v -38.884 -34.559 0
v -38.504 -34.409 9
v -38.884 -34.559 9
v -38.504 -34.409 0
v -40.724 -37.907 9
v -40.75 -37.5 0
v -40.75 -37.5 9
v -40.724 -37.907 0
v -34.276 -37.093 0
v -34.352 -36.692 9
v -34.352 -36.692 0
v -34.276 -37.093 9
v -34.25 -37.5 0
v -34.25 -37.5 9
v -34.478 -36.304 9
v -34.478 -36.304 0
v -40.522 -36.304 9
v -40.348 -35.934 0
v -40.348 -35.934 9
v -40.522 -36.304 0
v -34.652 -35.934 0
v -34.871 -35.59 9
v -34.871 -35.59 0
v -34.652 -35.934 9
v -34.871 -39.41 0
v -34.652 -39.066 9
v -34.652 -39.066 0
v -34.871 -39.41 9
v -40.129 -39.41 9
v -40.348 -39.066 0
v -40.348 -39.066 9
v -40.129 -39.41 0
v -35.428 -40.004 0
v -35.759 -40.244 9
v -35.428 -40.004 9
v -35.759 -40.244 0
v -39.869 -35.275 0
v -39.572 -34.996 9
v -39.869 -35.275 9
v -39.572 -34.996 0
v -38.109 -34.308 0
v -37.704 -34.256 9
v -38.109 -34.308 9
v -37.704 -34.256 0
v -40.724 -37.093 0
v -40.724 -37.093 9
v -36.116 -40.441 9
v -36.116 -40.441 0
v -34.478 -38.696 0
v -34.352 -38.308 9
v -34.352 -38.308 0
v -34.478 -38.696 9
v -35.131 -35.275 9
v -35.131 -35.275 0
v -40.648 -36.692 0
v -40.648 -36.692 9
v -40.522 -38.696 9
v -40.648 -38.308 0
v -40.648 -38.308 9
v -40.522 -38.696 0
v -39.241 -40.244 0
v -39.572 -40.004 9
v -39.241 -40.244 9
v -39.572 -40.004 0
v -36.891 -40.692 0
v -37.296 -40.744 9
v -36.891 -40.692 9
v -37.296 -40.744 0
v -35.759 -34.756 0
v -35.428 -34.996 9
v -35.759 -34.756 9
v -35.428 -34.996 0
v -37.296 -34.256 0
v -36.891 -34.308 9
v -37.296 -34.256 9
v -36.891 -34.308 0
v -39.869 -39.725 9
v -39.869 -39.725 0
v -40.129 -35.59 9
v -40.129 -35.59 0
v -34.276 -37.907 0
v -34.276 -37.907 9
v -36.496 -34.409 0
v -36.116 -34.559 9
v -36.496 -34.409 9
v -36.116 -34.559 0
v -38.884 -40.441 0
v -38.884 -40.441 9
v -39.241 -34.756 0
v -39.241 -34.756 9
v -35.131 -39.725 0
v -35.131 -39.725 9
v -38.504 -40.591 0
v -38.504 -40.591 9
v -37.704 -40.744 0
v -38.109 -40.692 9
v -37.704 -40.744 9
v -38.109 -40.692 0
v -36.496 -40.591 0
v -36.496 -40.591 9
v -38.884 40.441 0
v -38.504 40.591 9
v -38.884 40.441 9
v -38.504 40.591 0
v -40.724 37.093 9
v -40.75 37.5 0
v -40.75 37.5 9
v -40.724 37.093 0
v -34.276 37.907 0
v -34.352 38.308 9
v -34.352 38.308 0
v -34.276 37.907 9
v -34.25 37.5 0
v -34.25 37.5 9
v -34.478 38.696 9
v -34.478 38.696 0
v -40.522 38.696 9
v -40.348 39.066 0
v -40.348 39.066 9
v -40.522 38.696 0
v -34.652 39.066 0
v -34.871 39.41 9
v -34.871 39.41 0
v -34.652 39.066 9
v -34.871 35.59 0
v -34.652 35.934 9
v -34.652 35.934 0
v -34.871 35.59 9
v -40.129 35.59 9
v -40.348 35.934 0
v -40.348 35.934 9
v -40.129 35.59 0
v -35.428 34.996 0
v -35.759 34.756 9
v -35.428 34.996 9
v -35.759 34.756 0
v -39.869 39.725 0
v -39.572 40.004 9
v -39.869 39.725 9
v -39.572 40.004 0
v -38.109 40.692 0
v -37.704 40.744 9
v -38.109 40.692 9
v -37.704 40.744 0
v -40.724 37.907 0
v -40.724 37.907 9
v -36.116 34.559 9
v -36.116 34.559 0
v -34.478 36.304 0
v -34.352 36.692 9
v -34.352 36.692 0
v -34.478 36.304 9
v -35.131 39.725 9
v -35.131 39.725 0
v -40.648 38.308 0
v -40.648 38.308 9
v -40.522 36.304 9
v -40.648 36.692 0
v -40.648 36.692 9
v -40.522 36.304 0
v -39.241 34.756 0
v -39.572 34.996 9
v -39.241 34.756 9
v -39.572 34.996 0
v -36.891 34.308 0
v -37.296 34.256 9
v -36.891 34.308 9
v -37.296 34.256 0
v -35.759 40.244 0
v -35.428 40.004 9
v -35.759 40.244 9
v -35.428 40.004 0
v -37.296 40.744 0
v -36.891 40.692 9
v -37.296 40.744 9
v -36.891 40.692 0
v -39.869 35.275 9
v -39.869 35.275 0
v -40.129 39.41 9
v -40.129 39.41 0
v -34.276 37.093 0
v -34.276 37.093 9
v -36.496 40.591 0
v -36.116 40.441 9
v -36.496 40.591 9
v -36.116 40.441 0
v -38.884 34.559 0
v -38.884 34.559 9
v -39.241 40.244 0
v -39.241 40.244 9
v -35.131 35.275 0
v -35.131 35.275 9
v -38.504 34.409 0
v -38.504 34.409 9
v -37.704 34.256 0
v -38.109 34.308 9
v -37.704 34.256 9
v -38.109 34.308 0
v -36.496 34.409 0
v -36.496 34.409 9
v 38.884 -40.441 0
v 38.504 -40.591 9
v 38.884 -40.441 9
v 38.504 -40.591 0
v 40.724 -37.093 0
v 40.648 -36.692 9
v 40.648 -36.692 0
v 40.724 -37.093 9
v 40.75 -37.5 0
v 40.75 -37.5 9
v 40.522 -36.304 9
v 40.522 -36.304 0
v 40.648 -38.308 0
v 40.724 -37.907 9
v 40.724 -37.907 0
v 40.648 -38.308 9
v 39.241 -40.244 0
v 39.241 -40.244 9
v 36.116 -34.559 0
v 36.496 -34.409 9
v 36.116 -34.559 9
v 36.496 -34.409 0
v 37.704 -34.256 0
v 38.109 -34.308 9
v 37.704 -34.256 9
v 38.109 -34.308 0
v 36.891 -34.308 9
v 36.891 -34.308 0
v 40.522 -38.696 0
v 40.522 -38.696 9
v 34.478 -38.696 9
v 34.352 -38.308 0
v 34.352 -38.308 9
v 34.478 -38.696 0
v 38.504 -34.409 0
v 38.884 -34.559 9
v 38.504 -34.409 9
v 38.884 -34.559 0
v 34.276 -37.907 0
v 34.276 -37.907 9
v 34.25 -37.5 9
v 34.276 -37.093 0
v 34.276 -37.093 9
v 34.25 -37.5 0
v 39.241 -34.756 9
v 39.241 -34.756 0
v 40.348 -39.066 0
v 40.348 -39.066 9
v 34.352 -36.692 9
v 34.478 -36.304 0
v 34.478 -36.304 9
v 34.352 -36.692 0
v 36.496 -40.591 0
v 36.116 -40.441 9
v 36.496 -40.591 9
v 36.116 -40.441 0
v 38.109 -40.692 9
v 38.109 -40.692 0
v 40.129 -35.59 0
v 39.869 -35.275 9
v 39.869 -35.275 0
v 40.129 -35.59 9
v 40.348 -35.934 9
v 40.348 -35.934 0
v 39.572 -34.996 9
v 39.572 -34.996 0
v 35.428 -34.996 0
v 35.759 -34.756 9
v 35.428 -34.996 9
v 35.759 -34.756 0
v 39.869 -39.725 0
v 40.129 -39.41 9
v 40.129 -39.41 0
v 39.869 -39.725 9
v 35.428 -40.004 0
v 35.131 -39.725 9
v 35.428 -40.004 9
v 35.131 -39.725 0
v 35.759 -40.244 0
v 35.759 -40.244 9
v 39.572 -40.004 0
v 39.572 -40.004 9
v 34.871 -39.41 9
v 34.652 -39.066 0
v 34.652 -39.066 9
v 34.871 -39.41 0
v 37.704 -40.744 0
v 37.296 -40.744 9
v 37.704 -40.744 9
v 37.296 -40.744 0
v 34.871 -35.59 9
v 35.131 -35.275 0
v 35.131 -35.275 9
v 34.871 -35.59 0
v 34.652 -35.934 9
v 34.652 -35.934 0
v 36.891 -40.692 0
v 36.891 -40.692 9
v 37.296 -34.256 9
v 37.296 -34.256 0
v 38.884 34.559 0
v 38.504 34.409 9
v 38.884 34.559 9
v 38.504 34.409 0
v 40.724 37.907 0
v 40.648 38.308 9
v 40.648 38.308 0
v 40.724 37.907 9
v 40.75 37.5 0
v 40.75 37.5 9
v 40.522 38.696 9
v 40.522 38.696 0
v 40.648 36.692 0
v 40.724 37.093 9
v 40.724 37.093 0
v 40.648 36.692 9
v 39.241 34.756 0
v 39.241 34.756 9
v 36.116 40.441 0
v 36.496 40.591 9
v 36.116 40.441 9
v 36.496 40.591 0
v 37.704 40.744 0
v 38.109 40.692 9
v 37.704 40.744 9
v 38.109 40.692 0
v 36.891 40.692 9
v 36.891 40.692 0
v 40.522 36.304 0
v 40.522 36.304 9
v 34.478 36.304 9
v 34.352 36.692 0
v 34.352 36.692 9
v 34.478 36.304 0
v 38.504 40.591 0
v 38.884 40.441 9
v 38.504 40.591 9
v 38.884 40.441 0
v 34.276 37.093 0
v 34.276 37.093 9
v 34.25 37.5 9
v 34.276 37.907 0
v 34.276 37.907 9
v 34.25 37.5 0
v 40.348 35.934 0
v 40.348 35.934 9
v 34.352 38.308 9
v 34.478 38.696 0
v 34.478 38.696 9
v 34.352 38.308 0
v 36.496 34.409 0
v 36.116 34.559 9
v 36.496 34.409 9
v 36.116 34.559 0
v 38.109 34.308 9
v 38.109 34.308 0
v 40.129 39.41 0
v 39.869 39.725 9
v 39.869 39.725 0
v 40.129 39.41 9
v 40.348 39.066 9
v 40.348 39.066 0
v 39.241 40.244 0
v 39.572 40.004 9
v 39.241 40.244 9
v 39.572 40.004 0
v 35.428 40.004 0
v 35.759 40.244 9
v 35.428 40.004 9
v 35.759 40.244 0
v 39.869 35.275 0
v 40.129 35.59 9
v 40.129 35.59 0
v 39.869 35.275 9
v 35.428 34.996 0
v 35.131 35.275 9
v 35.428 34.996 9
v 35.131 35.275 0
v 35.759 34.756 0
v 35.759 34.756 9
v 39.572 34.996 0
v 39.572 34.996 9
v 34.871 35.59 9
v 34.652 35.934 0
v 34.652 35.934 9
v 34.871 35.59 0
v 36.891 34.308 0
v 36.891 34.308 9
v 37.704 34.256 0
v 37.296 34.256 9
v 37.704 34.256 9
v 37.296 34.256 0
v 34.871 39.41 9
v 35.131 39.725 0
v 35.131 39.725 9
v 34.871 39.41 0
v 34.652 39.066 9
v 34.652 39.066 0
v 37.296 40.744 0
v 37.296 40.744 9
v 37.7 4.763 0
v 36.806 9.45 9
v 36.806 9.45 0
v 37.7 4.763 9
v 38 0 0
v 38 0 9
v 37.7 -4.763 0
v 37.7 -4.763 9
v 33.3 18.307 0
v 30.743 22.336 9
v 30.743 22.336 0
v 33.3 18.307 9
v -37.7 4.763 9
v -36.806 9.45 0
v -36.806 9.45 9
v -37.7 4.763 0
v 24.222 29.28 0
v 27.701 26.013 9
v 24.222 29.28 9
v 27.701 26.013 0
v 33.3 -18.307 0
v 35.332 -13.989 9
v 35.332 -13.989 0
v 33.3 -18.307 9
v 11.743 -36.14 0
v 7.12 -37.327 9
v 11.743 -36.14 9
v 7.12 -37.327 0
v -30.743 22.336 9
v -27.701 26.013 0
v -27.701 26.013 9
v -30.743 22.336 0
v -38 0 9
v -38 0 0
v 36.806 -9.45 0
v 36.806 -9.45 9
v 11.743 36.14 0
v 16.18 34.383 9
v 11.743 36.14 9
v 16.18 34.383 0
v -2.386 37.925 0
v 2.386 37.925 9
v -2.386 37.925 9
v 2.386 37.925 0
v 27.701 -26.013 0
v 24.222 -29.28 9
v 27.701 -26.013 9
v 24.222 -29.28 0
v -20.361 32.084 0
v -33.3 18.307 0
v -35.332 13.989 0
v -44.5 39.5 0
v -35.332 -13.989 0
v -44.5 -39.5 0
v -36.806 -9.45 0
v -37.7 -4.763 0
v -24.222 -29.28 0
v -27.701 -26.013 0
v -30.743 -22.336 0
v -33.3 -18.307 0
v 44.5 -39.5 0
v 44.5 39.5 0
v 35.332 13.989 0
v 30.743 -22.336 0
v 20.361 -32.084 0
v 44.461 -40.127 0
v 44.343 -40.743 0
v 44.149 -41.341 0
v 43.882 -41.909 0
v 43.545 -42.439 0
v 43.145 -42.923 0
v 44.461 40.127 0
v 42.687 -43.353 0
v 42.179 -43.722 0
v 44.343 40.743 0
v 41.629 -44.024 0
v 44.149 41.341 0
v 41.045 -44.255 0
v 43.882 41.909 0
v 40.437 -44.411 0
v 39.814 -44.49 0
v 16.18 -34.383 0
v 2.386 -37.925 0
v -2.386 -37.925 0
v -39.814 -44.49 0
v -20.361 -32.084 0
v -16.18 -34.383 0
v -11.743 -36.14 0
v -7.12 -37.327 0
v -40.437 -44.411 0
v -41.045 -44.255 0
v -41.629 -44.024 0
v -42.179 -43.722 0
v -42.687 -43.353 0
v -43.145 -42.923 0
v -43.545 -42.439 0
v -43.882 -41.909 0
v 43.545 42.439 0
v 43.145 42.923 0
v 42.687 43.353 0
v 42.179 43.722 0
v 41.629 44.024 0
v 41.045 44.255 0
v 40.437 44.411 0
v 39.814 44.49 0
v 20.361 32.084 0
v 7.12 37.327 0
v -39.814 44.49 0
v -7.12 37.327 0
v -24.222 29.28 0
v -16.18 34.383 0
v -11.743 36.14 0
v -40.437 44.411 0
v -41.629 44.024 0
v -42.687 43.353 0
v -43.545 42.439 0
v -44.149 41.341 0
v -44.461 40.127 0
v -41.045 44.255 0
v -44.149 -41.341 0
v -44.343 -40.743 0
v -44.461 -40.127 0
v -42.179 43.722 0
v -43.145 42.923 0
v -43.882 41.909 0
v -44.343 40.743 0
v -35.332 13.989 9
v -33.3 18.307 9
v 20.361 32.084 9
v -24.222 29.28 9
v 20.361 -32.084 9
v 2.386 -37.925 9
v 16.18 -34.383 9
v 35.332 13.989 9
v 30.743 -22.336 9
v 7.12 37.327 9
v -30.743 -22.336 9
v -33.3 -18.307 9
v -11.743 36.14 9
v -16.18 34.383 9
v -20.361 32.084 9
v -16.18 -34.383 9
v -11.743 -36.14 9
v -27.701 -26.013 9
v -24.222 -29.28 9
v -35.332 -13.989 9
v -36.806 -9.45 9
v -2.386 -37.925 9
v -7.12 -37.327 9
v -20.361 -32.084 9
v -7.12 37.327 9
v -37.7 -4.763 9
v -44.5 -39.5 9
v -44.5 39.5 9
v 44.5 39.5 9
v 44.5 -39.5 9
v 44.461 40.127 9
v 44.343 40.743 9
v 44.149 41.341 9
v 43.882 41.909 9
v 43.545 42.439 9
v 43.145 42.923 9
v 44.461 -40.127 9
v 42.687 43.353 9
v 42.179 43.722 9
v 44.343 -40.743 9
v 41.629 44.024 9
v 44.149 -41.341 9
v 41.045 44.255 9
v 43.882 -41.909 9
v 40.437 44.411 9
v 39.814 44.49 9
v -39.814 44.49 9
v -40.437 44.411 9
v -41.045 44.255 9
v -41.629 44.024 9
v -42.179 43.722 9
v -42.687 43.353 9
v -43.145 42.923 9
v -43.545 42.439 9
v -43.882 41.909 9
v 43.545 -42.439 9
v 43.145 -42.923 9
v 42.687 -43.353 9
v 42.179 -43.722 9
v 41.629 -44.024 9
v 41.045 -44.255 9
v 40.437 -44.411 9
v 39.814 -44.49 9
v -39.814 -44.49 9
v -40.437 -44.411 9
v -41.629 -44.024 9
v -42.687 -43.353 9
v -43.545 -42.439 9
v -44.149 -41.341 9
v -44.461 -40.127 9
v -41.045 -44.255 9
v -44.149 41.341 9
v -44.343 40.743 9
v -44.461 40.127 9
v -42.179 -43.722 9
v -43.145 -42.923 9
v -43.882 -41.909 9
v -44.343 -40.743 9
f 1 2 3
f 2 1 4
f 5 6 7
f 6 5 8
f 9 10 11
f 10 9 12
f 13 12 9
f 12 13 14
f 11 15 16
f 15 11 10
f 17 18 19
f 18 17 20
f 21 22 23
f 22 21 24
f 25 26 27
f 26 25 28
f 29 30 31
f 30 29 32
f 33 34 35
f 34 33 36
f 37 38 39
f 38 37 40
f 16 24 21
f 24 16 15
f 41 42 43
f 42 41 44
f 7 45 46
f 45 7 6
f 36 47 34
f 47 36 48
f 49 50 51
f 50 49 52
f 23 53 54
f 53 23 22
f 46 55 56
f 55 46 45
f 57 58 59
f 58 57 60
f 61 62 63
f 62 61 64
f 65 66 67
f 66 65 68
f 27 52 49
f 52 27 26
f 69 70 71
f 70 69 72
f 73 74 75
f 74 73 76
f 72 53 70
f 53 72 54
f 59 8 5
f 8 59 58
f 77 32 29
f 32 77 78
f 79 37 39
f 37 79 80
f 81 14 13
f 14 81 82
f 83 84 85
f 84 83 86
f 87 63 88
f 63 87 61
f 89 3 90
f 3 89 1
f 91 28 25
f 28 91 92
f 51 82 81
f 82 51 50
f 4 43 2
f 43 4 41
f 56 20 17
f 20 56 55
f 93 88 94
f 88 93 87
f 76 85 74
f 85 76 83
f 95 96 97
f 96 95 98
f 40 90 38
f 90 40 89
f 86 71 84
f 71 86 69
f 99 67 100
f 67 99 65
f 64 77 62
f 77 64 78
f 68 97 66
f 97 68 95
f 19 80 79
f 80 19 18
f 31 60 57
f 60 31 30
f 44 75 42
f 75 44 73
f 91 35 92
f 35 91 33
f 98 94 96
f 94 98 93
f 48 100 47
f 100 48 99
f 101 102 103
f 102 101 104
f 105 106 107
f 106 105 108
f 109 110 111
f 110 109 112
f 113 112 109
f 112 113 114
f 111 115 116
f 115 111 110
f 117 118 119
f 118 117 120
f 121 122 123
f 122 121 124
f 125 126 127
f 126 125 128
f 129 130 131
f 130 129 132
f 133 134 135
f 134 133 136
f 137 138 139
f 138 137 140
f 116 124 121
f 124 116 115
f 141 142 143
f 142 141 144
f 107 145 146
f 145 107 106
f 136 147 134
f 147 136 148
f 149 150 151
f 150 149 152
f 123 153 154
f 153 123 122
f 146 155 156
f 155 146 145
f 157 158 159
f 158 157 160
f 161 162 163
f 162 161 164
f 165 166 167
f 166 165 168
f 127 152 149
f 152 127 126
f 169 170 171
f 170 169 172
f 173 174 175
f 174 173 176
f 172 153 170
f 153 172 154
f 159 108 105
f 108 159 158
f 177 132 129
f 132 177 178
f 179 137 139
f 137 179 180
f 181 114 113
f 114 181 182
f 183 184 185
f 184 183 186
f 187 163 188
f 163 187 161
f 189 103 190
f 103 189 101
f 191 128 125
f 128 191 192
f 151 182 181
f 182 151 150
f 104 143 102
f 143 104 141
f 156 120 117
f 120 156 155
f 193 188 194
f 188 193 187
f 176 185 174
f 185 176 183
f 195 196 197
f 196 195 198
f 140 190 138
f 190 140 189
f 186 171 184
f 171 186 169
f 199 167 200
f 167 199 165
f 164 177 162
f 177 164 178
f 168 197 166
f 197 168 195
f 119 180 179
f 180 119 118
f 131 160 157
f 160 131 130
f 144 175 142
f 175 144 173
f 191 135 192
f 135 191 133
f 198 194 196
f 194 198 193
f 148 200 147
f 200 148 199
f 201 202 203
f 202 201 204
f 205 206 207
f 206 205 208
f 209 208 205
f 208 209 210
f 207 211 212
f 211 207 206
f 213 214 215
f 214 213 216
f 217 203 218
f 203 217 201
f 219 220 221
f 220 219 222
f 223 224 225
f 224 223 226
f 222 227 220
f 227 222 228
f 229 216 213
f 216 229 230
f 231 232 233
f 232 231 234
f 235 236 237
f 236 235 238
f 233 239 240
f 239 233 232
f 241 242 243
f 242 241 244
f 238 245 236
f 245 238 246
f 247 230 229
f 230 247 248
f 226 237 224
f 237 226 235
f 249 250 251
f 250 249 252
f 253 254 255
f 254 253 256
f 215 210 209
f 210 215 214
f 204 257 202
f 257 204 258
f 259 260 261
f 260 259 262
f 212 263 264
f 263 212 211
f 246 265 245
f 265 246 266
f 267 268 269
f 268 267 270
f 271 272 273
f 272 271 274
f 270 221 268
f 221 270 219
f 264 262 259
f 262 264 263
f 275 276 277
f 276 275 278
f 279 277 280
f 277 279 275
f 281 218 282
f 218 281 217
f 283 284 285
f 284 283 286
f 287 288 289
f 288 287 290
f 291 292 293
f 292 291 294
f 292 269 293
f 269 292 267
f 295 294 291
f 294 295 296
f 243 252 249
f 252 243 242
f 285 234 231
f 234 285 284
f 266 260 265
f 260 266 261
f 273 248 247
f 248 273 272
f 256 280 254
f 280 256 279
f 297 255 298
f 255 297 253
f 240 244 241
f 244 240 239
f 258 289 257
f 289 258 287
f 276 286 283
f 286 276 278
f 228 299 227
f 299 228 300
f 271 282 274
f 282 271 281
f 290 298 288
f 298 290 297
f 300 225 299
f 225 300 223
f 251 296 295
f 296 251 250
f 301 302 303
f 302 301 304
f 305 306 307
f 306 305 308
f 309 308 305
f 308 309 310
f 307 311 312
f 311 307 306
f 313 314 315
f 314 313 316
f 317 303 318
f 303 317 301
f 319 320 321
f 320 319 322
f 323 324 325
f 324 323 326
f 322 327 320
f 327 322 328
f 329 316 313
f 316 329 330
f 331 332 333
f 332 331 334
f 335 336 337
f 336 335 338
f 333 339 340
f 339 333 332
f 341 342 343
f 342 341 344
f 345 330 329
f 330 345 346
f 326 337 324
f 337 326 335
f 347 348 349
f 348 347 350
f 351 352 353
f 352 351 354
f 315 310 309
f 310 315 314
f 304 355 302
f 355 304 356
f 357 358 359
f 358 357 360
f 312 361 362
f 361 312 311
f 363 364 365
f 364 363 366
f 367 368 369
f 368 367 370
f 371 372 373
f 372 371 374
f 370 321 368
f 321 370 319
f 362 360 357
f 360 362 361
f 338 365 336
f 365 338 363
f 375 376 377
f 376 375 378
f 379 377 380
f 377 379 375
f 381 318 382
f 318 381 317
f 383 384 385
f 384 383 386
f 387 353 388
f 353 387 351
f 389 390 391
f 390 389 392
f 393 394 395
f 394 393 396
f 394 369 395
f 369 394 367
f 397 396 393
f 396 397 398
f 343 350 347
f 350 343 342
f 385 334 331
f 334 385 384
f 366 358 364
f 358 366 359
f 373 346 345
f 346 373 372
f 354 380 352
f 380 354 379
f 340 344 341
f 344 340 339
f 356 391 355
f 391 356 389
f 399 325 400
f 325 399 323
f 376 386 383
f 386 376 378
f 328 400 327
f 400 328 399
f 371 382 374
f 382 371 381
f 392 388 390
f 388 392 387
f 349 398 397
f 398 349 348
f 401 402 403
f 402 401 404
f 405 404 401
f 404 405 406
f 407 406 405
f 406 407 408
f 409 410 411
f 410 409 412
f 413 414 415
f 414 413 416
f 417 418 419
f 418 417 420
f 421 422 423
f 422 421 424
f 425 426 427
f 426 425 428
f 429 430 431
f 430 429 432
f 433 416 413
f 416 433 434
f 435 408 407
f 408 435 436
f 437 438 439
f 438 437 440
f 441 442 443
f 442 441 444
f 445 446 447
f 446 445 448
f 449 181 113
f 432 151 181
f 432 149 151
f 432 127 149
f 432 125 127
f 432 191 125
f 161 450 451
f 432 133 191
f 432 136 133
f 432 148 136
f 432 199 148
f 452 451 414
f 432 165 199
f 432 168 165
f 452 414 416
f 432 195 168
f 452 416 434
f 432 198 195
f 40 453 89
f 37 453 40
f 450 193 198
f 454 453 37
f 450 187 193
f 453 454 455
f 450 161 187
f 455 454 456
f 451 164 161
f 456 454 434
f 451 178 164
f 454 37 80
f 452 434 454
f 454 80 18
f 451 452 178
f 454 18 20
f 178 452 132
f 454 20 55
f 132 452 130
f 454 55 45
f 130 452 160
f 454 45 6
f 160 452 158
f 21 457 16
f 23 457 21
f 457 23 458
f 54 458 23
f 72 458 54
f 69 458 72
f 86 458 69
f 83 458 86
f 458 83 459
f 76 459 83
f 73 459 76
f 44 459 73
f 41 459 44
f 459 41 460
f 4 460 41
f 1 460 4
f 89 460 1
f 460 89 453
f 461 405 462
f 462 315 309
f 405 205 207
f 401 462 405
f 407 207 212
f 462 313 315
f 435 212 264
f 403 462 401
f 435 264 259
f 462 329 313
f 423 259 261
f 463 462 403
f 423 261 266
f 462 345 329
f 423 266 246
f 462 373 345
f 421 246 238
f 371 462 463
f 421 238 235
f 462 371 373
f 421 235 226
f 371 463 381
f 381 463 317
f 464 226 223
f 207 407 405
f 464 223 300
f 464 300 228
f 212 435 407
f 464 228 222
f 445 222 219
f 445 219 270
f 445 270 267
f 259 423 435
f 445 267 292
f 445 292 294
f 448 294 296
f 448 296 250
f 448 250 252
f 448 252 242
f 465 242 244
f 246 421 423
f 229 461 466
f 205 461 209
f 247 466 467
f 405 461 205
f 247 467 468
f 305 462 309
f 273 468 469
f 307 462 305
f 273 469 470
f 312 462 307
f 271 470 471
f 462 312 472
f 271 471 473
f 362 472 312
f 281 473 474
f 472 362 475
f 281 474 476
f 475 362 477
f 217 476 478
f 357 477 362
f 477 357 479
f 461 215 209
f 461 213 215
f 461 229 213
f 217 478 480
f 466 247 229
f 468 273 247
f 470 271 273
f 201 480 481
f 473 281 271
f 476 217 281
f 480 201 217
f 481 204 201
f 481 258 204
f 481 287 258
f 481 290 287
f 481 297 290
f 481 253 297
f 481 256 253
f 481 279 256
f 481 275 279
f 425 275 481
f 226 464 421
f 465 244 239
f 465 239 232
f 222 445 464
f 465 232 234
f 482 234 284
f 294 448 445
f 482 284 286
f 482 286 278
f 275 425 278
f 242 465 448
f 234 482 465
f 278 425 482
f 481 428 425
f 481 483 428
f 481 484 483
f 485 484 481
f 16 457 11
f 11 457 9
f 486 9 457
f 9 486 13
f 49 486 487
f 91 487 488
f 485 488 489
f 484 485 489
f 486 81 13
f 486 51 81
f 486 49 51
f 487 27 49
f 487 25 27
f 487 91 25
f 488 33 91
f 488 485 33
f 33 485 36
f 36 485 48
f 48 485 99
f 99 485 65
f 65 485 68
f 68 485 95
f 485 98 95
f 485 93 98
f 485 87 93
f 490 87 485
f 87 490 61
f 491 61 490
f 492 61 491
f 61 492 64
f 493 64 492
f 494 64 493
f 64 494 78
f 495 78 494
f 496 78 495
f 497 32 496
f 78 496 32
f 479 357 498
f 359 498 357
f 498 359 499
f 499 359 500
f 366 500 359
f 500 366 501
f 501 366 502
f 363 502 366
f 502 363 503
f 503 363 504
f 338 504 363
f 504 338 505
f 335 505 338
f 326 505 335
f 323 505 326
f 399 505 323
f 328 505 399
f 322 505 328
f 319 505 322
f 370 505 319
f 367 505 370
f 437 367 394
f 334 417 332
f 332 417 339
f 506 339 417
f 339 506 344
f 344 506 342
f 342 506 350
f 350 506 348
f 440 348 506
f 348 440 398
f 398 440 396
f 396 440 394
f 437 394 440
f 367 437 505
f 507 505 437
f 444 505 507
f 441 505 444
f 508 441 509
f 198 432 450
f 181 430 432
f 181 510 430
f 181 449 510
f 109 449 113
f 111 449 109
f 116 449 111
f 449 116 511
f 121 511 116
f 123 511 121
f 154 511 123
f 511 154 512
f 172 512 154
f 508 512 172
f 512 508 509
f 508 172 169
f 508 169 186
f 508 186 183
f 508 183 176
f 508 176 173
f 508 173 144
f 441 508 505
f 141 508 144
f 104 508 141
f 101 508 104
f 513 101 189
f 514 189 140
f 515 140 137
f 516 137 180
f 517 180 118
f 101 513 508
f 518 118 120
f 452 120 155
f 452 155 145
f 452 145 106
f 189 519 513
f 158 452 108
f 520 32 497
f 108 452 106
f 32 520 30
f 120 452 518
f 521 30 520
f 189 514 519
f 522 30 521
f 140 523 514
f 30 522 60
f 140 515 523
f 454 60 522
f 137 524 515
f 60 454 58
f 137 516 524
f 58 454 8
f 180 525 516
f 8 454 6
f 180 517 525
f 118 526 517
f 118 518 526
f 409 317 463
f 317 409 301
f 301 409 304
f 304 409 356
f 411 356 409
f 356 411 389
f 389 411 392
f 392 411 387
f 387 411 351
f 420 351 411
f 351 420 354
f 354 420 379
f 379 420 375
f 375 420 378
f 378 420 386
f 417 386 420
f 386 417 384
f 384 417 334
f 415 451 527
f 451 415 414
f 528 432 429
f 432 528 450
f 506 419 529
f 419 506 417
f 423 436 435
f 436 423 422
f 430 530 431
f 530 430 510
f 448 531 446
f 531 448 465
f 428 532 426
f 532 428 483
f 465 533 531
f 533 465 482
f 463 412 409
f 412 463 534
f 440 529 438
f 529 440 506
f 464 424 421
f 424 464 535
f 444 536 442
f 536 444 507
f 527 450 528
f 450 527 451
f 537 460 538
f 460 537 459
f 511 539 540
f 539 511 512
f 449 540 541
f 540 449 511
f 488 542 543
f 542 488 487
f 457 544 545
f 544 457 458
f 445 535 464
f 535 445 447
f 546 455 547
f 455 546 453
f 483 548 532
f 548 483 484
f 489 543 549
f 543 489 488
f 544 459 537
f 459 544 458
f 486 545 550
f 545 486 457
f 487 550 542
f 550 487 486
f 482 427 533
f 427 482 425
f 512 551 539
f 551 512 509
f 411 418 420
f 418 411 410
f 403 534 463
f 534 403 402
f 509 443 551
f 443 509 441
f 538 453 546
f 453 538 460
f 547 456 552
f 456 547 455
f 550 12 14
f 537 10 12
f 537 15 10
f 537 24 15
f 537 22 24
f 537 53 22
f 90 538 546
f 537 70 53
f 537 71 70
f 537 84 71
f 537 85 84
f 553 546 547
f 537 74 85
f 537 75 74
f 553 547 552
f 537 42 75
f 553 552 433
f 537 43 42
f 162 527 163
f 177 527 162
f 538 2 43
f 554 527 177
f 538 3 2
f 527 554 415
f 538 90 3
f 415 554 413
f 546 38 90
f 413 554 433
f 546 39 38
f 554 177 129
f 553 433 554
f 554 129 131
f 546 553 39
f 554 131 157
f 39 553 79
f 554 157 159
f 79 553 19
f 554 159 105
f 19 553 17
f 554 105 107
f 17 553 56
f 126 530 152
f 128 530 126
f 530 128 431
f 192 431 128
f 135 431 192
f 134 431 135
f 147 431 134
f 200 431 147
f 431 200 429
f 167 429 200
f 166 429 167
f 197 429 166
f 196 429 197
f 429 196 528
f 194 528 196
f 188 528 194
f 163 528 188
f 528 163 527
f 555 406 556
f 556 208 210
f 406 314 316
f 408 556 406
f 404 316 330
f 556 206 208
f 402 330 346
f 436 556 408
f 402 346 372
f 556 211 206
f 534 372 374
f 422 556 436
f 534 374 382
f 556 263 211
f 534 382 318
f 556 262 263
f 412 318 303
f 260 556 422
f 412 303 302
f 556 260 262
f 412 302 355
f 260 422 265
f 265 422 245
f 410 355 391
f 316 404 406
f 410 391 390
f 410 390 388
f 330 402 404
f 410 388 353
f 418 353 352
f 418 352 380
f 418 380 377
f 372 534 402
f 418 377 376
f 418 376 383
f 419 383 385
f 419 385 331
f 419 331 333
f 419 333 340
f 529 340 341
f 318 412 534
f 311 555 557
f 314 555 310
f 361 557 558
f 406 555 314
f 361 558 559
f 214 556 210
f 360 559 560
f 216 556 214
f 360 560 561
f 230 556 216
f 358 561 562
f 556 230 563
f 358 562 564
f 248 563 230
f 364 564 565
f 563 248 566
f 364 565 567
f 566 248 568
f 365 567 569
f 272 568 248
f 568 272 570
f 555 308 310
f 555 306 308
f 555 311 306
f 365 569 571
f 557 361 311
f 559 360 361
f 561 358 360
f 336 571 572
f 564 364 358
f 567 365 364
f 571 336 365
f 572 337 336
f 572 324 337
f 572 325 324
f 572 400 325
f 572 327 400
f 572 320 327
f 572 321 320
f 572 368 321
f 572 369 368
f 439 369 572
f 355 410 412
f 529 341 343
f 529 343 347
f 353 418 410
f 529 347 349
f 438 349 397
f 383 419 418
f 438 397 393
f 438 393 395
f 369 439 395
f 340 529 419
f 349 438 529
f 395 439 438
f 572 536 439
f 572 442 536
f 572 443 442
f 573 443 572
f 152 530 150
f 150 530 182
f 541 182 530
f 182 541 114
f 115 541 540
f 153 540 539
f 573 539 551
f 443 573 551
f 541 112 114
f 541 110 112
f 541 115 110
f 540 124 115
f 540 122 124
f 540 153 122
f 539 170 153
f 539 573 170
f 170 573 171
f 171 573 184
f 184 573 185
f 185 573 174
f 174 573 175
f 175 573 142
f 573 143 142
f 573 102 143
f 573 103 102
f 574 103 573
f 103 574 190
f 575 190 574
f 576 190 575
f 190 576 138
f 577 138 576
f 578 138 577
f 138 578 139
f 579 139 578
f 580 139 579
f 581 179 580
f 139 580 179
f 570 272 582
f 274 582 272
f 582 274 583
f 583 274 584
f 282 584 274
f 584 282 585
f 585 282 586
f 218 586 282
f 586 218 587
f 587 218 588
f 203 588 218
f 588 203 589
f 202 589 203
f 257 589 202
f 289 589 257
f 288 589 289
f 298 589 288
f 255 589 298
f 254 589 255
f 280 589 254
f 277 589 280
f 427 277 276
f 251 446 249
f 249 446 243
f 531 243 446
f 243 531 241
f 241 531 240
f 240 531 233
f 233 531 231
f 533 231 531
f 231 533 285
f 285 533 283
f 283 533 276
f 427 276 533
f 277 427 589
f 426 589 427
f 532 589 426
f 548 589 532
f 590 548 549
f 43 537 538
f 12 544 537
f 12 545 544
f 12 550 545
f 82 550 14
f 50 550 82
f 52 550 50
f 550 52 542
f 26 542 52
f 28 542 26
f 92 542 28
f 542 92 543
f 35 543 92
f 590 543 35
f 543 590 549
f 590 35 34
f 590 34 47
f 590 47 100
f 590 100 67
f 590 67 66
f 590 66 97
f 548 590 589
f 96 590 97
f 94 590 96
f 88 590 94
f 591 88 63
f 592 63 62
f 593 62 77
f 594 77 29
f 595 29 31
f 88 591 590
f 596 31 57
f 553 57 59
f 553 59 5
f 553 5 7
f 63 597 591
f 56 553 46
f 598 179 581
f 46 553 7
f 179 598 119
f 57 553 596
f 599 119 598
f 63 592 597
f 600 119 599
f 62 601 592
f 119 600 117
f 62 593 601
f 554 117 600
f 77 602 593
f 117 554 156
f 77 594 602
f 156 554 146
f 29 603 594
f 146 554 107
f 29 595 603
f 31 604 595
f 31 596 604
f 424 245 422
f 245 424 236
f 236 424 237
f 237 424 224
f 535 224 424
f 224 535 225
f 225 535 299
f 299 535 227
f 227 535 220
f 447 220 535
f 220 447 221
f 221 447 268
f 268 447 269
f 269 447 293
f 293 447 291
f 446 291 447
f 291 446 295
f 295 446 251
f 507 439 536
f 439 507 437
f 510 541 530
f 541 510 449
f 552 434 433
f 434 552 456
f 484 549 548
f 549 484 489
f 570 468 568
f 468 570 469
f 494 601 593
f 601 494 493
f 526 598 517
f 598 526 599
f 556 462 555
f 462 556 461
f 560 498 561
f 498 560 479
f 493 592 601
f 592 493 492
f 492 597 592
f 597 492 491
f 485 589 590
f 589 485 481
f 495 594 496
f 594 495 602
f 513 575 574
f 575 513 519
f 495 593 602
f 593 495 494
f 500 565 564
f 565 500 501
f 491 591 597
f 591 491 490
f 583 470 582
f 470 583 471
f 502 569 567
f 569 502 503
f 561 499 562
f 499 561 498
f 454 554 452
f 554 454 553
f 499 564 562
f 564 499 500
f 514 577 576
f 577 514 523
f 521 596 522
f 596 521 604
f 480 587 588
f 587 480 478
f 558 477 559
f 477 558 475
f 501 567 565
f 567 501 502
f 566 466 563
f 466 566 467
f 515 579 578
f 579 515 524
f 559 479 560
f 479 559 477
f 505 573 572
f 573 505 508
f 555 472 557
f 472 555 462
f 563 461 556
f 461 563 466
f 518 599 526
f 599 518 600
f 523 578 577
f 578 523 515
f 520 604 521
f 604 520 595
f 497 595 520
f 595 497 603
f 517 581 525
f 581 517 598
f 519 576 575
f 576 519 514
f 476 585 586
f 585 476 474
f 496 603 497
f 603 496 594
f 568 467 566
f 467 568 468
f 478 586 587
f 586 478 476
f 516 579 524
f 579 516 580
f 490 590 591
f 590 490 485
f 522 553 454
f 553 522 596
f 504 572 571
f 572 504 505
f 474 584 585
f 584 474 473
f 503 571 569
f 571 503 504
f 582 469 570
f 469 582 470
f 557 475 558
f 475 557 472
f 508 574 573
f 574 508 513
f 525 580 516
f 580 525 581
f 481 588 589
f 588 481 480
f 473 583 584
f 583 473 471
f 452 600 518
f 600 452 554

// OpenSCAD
$fn = 50;


difference() {
	union() {
		hull() {
			translate(v = [-39.5000000000, 39.5000000000, 0]) {
				cylinder(h = 9, r = 5);
			}
			translate(v = [39.5000000000, 39.5000000000, 0]) {
				cylinder(h = 9, r = 5);
			}
			translate(v = [-39.5000000000, -39.5000000000, 0]) {
				cylinder(h = 9, r = 5);
			}
			translate(v = [39.5000000000, -39.5000000000, 0]) {
				cylinder(h = 9, r = 5);
			}
		}
	}
	union() {
		#translate(v = [-37.5000000000, -37.5000000000, -100.0000000000]) {
			cylinder(h = 200, r = 3.2500000000);
		}
		#translate(v = [-37.5000000000, 37.5000000000, -100.0000000000]) {
			cylinder(h = 200, r = 3.2500000000);
		}
		#translate(v = [37.5000000000, -37.5000000000, -100.0000000000]) {
			cylinder(h = 200, r = 3.2500000000);
		}
		#translate(v = [37.5000000000, 37.5000000000, -100.0000000000]) {
			cylinder(h = 200, r = 3.2500000000);
		}
		#cylinder(h = 9, r = 38.0000000000);
	}
}
